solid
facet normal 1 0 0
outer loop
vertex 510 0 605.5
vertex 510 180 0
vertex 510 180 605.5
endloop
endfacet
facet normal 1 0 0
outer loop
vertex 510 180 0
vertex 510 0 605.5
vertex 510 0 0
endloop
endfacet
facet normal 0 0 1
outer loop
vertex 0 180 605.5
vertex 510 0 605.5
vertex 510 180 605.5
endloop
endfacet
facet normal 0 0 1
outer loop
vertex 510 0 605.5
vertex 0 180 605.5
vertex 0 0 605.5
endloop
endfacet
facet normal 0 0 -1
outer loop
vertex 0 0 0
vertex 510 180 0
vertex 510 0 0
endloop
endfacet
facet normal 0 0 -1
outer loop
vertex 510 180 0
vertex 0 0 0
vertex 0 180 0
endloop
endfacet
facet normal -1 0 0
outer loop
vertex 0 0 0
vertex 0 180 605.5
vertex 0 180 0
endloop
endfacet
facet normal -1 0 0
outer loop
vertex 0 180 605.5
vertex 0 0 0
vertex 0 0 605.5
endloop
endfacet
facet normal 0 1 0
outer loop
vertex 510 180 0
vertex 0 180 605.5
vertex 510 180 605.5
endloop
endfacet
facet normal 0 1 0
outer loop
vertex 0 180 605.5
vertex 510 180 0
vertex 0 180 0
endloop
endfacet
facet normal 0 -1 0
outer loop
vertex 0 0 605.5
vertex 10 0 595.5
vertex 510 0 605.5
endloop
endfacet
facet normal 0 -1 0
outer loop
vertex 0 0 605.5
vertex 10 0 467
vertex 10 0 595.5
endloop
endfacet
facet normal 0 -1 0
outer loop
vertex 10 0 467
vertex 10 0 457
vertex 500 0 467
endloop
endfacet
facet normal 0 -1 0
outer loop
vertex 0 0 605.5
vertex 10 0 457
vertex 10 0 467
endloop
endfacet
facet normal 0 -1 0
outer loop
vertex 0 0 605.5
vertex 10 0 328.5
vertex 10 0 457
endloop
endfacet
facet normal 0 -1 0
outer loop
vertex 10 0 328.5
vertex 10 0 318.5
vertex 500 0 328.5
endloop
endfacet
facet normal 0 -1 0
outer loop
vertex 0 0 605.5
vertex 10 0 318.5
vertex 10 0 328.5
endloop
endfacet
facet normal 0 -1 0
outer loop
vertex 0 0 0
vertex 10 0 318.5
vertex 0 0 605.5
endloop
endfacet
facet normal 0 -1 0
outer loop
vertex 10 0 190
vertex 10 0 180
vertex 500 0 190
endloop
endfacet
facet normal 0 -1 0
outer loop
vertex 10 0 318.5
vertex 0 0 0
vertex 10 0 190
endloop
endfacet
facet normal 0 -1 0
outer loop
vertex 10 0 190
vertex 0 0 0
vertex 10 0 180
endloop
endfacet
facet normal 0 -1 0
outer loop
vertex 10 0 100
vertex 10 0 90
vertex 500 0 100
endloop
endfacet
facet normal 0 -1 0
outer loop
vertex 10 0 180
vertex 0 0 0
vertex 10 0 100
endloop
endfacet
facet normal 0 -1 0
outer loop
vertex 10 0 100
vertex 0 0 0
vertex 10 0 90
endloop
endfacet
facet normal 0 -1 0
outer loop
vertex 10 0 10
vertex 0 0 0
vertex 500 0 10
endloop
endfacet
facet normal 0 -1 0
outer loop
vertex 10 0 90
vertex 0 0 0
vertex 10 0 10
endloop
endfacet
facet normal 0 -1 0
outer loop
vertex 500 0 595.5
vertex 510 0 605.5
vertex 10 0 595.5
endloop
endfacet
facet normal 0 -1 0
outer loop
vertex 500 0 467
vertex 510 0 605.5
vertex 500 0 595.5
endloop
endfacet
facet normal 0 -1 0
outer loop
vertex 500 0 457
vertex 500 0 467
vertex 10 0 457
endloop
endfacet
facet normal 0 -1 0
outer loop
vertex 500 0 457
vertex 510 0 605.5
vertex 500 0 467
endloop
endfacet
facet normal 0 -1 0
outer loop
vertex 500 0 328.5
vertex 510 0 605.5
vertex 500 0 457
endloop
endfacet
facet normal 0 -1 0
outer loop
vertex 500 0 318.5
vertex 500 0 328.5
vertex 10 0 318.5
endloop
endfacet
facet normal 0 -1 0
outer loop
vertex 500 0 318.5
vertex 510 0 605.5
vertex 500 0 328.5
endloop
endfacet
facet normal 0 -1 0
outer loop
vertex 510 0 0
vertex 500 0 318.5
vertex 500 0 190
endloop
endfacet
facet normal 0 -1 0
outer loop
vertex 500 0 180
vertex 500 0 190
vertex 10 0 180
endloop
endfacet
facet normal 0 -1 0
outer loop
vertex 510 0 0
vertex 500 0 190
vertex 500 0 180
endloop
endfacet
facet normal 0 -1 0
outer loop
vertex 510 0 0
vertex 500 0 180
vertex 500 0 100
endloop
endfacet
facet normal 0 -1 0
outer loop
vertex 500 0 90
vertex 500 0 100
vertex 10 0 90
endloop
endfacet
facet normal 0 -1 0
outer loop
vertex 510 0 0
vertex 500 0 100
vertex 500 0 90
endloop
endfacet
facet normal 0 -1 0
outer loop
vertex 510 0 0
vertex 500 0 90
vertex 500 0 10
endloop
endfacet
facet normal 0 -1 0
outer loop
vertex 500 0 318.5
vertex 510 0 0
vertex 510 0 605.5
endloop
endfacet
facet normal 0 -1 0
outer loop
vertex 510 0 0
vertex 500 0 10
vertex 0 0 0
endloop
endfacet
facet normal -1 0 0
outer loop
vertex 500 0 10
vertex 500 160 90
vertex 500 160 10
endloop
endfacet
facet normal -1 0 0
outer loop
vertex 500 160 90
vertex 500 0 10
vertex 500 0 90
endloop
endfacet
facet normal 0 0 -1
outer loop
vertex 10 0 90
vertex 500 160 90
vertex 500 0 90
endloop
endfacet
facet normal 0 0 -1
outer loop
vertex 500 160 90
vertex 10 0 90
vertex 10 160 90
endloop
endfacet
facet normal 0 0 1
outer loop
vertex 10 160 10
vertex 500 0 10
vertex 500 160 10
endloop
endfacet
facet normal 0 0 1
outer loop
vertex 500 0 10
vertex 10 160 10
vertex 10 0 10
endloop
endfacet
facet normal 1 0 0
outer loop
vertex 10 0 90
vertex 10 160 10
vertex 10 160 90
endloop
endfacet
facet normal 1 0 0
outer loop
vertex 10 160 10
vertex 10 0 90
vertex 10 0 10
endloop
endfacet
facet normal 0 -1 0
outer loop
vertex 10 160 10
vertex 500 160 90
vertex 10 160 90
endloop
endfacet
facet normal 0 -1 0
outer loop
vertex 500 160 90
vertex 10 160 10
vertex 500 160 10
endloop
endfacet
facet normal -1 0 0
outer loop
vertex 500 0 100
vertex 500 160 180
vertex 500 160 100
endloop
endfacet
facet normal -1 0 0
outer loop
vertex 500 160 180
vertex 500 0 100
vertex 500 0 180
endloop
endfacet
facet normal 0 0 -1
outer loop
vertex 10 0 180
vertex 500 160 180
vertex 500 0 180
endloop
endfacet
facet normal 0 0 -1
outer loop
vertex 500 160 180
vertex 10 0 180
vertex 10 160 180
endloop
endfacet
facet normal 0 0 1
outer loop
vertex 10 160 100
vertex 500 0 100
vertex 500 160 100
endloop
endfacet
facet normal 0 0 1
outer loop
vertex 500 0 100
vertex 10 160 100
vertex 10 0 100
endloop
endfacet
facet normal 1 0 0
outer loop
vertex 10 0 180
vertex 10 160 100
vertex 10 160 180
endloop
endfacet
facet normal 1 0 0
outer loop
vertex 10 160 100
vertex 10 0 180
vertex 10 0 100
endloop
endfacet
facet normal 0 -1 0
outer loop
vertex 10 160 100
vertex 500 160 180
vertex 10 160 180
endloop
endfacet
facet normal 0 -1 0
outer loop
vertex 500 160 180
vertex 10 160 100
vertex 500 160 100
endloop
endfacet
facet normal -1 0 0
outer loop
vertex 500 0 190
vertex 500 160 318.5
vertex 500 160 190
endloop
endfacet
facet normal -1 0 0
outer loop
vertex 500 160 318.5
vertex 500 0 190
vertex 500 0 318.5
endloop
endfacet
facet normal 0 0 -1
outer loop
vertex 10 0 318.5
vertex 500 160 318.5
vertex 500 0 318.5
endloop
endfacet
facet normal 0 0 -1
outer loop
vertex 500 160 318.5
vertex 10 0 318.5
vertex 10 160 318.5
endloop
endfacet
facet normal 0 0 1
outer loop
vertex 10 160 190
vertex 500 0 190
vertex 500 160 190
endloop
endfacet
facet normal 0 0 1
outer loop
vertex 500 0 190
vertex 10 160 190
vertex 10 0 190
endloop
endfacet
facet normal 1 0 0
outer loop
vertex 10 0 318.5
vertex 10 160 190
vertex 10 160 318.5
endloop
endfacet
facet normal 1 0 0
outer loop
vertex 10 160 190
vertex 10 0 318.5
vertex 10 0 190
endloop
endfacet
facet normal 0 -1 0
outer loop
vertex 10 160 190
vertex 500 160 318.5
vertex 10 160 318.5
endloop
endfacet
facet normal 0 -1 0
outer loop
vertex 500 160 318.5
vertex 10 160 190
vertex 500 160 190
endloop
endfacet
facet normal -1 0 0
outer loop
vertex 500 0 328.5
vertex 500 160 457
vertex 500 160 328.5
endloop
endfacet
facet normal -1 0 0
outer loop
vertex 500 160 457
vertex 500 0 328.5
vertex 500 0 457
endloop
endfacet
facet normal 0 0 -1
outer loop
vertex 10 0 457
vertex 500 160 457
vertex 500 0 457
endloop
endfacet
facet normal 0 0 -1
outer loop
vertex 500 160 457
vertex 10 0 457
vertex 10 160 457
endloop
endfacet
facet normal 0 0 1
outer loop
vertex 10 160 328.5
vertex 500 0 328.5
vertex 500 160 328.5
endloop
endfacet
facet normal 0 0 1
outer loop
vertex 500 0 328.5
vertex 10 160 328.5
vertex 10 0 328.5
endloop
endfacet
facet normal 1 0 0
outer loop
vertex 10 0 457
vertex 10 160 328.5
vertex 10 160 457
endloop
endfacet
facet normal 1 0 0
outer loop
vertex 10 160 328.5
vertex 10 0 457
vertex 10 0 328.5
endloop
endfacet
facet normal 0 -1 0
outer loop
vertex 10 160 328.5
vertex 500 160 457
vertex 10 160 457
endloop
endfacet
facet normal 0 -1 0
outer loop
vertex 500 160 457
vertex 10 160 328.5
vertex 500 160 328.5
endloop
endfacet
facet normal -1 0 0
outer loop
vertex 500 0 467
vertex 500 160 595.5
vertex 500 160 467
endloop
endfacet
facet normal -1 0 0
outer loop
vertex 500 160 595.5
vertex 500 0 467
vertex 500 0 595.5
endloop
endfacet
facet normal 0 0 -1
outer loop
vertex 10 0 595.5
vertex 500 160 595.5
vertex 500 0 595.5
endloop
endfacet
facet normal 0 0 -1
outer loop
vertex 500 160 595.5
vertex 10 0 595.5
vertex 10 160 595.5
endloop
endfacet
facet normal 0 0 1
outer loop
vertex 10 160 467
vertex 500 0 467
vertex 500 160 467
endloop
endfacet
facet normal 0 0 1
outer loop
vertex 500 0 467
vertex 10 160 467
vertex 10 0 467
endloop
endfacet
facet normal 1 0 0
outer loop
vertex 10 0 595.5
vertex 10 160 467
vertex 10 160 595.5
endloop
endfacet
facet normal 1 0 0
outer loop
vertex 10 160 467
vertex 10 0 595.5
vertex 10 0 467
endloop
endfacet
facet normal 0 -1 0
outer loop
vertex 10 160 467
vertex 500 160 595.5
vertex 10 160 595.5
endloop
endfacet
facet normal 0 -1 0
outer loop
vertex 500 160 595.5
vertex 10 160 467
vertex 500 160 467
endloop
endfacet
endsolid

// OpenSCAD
//keyboard dimensions
kb_l = 490;
kb_h = 80;
kb_w = 160;

//strength of wood
s = 10;

num_modules = 3;
num_bottom_parts = 2;
module_h = 128.5;


h = s + num_bottom_parts*(s+kb_h) + num_modules*(module_h + s);

w = kb_l + 2*s;
d = kb_w + 2*s;

difference() {
cube([w,d,h]);
translate([s,0,s]) cube([kb_l,kb_w,kb_h]);
translate([s,0,kb_h+2*s]) cube([kb_l,kb_w,kb_h]);

translate([s,0,2*kb_h+3*s]) cube([kb_l,kb_w,module_h]);
translate([s,0,2*kb_h+1*module_h+4*s]) cube([kb_l,kb_w,module_h]);
translate([s,0,2*kb_h+2*module_h+5*s]) cube([kb_l,kb_w,module_h]);





}

echo(h);
